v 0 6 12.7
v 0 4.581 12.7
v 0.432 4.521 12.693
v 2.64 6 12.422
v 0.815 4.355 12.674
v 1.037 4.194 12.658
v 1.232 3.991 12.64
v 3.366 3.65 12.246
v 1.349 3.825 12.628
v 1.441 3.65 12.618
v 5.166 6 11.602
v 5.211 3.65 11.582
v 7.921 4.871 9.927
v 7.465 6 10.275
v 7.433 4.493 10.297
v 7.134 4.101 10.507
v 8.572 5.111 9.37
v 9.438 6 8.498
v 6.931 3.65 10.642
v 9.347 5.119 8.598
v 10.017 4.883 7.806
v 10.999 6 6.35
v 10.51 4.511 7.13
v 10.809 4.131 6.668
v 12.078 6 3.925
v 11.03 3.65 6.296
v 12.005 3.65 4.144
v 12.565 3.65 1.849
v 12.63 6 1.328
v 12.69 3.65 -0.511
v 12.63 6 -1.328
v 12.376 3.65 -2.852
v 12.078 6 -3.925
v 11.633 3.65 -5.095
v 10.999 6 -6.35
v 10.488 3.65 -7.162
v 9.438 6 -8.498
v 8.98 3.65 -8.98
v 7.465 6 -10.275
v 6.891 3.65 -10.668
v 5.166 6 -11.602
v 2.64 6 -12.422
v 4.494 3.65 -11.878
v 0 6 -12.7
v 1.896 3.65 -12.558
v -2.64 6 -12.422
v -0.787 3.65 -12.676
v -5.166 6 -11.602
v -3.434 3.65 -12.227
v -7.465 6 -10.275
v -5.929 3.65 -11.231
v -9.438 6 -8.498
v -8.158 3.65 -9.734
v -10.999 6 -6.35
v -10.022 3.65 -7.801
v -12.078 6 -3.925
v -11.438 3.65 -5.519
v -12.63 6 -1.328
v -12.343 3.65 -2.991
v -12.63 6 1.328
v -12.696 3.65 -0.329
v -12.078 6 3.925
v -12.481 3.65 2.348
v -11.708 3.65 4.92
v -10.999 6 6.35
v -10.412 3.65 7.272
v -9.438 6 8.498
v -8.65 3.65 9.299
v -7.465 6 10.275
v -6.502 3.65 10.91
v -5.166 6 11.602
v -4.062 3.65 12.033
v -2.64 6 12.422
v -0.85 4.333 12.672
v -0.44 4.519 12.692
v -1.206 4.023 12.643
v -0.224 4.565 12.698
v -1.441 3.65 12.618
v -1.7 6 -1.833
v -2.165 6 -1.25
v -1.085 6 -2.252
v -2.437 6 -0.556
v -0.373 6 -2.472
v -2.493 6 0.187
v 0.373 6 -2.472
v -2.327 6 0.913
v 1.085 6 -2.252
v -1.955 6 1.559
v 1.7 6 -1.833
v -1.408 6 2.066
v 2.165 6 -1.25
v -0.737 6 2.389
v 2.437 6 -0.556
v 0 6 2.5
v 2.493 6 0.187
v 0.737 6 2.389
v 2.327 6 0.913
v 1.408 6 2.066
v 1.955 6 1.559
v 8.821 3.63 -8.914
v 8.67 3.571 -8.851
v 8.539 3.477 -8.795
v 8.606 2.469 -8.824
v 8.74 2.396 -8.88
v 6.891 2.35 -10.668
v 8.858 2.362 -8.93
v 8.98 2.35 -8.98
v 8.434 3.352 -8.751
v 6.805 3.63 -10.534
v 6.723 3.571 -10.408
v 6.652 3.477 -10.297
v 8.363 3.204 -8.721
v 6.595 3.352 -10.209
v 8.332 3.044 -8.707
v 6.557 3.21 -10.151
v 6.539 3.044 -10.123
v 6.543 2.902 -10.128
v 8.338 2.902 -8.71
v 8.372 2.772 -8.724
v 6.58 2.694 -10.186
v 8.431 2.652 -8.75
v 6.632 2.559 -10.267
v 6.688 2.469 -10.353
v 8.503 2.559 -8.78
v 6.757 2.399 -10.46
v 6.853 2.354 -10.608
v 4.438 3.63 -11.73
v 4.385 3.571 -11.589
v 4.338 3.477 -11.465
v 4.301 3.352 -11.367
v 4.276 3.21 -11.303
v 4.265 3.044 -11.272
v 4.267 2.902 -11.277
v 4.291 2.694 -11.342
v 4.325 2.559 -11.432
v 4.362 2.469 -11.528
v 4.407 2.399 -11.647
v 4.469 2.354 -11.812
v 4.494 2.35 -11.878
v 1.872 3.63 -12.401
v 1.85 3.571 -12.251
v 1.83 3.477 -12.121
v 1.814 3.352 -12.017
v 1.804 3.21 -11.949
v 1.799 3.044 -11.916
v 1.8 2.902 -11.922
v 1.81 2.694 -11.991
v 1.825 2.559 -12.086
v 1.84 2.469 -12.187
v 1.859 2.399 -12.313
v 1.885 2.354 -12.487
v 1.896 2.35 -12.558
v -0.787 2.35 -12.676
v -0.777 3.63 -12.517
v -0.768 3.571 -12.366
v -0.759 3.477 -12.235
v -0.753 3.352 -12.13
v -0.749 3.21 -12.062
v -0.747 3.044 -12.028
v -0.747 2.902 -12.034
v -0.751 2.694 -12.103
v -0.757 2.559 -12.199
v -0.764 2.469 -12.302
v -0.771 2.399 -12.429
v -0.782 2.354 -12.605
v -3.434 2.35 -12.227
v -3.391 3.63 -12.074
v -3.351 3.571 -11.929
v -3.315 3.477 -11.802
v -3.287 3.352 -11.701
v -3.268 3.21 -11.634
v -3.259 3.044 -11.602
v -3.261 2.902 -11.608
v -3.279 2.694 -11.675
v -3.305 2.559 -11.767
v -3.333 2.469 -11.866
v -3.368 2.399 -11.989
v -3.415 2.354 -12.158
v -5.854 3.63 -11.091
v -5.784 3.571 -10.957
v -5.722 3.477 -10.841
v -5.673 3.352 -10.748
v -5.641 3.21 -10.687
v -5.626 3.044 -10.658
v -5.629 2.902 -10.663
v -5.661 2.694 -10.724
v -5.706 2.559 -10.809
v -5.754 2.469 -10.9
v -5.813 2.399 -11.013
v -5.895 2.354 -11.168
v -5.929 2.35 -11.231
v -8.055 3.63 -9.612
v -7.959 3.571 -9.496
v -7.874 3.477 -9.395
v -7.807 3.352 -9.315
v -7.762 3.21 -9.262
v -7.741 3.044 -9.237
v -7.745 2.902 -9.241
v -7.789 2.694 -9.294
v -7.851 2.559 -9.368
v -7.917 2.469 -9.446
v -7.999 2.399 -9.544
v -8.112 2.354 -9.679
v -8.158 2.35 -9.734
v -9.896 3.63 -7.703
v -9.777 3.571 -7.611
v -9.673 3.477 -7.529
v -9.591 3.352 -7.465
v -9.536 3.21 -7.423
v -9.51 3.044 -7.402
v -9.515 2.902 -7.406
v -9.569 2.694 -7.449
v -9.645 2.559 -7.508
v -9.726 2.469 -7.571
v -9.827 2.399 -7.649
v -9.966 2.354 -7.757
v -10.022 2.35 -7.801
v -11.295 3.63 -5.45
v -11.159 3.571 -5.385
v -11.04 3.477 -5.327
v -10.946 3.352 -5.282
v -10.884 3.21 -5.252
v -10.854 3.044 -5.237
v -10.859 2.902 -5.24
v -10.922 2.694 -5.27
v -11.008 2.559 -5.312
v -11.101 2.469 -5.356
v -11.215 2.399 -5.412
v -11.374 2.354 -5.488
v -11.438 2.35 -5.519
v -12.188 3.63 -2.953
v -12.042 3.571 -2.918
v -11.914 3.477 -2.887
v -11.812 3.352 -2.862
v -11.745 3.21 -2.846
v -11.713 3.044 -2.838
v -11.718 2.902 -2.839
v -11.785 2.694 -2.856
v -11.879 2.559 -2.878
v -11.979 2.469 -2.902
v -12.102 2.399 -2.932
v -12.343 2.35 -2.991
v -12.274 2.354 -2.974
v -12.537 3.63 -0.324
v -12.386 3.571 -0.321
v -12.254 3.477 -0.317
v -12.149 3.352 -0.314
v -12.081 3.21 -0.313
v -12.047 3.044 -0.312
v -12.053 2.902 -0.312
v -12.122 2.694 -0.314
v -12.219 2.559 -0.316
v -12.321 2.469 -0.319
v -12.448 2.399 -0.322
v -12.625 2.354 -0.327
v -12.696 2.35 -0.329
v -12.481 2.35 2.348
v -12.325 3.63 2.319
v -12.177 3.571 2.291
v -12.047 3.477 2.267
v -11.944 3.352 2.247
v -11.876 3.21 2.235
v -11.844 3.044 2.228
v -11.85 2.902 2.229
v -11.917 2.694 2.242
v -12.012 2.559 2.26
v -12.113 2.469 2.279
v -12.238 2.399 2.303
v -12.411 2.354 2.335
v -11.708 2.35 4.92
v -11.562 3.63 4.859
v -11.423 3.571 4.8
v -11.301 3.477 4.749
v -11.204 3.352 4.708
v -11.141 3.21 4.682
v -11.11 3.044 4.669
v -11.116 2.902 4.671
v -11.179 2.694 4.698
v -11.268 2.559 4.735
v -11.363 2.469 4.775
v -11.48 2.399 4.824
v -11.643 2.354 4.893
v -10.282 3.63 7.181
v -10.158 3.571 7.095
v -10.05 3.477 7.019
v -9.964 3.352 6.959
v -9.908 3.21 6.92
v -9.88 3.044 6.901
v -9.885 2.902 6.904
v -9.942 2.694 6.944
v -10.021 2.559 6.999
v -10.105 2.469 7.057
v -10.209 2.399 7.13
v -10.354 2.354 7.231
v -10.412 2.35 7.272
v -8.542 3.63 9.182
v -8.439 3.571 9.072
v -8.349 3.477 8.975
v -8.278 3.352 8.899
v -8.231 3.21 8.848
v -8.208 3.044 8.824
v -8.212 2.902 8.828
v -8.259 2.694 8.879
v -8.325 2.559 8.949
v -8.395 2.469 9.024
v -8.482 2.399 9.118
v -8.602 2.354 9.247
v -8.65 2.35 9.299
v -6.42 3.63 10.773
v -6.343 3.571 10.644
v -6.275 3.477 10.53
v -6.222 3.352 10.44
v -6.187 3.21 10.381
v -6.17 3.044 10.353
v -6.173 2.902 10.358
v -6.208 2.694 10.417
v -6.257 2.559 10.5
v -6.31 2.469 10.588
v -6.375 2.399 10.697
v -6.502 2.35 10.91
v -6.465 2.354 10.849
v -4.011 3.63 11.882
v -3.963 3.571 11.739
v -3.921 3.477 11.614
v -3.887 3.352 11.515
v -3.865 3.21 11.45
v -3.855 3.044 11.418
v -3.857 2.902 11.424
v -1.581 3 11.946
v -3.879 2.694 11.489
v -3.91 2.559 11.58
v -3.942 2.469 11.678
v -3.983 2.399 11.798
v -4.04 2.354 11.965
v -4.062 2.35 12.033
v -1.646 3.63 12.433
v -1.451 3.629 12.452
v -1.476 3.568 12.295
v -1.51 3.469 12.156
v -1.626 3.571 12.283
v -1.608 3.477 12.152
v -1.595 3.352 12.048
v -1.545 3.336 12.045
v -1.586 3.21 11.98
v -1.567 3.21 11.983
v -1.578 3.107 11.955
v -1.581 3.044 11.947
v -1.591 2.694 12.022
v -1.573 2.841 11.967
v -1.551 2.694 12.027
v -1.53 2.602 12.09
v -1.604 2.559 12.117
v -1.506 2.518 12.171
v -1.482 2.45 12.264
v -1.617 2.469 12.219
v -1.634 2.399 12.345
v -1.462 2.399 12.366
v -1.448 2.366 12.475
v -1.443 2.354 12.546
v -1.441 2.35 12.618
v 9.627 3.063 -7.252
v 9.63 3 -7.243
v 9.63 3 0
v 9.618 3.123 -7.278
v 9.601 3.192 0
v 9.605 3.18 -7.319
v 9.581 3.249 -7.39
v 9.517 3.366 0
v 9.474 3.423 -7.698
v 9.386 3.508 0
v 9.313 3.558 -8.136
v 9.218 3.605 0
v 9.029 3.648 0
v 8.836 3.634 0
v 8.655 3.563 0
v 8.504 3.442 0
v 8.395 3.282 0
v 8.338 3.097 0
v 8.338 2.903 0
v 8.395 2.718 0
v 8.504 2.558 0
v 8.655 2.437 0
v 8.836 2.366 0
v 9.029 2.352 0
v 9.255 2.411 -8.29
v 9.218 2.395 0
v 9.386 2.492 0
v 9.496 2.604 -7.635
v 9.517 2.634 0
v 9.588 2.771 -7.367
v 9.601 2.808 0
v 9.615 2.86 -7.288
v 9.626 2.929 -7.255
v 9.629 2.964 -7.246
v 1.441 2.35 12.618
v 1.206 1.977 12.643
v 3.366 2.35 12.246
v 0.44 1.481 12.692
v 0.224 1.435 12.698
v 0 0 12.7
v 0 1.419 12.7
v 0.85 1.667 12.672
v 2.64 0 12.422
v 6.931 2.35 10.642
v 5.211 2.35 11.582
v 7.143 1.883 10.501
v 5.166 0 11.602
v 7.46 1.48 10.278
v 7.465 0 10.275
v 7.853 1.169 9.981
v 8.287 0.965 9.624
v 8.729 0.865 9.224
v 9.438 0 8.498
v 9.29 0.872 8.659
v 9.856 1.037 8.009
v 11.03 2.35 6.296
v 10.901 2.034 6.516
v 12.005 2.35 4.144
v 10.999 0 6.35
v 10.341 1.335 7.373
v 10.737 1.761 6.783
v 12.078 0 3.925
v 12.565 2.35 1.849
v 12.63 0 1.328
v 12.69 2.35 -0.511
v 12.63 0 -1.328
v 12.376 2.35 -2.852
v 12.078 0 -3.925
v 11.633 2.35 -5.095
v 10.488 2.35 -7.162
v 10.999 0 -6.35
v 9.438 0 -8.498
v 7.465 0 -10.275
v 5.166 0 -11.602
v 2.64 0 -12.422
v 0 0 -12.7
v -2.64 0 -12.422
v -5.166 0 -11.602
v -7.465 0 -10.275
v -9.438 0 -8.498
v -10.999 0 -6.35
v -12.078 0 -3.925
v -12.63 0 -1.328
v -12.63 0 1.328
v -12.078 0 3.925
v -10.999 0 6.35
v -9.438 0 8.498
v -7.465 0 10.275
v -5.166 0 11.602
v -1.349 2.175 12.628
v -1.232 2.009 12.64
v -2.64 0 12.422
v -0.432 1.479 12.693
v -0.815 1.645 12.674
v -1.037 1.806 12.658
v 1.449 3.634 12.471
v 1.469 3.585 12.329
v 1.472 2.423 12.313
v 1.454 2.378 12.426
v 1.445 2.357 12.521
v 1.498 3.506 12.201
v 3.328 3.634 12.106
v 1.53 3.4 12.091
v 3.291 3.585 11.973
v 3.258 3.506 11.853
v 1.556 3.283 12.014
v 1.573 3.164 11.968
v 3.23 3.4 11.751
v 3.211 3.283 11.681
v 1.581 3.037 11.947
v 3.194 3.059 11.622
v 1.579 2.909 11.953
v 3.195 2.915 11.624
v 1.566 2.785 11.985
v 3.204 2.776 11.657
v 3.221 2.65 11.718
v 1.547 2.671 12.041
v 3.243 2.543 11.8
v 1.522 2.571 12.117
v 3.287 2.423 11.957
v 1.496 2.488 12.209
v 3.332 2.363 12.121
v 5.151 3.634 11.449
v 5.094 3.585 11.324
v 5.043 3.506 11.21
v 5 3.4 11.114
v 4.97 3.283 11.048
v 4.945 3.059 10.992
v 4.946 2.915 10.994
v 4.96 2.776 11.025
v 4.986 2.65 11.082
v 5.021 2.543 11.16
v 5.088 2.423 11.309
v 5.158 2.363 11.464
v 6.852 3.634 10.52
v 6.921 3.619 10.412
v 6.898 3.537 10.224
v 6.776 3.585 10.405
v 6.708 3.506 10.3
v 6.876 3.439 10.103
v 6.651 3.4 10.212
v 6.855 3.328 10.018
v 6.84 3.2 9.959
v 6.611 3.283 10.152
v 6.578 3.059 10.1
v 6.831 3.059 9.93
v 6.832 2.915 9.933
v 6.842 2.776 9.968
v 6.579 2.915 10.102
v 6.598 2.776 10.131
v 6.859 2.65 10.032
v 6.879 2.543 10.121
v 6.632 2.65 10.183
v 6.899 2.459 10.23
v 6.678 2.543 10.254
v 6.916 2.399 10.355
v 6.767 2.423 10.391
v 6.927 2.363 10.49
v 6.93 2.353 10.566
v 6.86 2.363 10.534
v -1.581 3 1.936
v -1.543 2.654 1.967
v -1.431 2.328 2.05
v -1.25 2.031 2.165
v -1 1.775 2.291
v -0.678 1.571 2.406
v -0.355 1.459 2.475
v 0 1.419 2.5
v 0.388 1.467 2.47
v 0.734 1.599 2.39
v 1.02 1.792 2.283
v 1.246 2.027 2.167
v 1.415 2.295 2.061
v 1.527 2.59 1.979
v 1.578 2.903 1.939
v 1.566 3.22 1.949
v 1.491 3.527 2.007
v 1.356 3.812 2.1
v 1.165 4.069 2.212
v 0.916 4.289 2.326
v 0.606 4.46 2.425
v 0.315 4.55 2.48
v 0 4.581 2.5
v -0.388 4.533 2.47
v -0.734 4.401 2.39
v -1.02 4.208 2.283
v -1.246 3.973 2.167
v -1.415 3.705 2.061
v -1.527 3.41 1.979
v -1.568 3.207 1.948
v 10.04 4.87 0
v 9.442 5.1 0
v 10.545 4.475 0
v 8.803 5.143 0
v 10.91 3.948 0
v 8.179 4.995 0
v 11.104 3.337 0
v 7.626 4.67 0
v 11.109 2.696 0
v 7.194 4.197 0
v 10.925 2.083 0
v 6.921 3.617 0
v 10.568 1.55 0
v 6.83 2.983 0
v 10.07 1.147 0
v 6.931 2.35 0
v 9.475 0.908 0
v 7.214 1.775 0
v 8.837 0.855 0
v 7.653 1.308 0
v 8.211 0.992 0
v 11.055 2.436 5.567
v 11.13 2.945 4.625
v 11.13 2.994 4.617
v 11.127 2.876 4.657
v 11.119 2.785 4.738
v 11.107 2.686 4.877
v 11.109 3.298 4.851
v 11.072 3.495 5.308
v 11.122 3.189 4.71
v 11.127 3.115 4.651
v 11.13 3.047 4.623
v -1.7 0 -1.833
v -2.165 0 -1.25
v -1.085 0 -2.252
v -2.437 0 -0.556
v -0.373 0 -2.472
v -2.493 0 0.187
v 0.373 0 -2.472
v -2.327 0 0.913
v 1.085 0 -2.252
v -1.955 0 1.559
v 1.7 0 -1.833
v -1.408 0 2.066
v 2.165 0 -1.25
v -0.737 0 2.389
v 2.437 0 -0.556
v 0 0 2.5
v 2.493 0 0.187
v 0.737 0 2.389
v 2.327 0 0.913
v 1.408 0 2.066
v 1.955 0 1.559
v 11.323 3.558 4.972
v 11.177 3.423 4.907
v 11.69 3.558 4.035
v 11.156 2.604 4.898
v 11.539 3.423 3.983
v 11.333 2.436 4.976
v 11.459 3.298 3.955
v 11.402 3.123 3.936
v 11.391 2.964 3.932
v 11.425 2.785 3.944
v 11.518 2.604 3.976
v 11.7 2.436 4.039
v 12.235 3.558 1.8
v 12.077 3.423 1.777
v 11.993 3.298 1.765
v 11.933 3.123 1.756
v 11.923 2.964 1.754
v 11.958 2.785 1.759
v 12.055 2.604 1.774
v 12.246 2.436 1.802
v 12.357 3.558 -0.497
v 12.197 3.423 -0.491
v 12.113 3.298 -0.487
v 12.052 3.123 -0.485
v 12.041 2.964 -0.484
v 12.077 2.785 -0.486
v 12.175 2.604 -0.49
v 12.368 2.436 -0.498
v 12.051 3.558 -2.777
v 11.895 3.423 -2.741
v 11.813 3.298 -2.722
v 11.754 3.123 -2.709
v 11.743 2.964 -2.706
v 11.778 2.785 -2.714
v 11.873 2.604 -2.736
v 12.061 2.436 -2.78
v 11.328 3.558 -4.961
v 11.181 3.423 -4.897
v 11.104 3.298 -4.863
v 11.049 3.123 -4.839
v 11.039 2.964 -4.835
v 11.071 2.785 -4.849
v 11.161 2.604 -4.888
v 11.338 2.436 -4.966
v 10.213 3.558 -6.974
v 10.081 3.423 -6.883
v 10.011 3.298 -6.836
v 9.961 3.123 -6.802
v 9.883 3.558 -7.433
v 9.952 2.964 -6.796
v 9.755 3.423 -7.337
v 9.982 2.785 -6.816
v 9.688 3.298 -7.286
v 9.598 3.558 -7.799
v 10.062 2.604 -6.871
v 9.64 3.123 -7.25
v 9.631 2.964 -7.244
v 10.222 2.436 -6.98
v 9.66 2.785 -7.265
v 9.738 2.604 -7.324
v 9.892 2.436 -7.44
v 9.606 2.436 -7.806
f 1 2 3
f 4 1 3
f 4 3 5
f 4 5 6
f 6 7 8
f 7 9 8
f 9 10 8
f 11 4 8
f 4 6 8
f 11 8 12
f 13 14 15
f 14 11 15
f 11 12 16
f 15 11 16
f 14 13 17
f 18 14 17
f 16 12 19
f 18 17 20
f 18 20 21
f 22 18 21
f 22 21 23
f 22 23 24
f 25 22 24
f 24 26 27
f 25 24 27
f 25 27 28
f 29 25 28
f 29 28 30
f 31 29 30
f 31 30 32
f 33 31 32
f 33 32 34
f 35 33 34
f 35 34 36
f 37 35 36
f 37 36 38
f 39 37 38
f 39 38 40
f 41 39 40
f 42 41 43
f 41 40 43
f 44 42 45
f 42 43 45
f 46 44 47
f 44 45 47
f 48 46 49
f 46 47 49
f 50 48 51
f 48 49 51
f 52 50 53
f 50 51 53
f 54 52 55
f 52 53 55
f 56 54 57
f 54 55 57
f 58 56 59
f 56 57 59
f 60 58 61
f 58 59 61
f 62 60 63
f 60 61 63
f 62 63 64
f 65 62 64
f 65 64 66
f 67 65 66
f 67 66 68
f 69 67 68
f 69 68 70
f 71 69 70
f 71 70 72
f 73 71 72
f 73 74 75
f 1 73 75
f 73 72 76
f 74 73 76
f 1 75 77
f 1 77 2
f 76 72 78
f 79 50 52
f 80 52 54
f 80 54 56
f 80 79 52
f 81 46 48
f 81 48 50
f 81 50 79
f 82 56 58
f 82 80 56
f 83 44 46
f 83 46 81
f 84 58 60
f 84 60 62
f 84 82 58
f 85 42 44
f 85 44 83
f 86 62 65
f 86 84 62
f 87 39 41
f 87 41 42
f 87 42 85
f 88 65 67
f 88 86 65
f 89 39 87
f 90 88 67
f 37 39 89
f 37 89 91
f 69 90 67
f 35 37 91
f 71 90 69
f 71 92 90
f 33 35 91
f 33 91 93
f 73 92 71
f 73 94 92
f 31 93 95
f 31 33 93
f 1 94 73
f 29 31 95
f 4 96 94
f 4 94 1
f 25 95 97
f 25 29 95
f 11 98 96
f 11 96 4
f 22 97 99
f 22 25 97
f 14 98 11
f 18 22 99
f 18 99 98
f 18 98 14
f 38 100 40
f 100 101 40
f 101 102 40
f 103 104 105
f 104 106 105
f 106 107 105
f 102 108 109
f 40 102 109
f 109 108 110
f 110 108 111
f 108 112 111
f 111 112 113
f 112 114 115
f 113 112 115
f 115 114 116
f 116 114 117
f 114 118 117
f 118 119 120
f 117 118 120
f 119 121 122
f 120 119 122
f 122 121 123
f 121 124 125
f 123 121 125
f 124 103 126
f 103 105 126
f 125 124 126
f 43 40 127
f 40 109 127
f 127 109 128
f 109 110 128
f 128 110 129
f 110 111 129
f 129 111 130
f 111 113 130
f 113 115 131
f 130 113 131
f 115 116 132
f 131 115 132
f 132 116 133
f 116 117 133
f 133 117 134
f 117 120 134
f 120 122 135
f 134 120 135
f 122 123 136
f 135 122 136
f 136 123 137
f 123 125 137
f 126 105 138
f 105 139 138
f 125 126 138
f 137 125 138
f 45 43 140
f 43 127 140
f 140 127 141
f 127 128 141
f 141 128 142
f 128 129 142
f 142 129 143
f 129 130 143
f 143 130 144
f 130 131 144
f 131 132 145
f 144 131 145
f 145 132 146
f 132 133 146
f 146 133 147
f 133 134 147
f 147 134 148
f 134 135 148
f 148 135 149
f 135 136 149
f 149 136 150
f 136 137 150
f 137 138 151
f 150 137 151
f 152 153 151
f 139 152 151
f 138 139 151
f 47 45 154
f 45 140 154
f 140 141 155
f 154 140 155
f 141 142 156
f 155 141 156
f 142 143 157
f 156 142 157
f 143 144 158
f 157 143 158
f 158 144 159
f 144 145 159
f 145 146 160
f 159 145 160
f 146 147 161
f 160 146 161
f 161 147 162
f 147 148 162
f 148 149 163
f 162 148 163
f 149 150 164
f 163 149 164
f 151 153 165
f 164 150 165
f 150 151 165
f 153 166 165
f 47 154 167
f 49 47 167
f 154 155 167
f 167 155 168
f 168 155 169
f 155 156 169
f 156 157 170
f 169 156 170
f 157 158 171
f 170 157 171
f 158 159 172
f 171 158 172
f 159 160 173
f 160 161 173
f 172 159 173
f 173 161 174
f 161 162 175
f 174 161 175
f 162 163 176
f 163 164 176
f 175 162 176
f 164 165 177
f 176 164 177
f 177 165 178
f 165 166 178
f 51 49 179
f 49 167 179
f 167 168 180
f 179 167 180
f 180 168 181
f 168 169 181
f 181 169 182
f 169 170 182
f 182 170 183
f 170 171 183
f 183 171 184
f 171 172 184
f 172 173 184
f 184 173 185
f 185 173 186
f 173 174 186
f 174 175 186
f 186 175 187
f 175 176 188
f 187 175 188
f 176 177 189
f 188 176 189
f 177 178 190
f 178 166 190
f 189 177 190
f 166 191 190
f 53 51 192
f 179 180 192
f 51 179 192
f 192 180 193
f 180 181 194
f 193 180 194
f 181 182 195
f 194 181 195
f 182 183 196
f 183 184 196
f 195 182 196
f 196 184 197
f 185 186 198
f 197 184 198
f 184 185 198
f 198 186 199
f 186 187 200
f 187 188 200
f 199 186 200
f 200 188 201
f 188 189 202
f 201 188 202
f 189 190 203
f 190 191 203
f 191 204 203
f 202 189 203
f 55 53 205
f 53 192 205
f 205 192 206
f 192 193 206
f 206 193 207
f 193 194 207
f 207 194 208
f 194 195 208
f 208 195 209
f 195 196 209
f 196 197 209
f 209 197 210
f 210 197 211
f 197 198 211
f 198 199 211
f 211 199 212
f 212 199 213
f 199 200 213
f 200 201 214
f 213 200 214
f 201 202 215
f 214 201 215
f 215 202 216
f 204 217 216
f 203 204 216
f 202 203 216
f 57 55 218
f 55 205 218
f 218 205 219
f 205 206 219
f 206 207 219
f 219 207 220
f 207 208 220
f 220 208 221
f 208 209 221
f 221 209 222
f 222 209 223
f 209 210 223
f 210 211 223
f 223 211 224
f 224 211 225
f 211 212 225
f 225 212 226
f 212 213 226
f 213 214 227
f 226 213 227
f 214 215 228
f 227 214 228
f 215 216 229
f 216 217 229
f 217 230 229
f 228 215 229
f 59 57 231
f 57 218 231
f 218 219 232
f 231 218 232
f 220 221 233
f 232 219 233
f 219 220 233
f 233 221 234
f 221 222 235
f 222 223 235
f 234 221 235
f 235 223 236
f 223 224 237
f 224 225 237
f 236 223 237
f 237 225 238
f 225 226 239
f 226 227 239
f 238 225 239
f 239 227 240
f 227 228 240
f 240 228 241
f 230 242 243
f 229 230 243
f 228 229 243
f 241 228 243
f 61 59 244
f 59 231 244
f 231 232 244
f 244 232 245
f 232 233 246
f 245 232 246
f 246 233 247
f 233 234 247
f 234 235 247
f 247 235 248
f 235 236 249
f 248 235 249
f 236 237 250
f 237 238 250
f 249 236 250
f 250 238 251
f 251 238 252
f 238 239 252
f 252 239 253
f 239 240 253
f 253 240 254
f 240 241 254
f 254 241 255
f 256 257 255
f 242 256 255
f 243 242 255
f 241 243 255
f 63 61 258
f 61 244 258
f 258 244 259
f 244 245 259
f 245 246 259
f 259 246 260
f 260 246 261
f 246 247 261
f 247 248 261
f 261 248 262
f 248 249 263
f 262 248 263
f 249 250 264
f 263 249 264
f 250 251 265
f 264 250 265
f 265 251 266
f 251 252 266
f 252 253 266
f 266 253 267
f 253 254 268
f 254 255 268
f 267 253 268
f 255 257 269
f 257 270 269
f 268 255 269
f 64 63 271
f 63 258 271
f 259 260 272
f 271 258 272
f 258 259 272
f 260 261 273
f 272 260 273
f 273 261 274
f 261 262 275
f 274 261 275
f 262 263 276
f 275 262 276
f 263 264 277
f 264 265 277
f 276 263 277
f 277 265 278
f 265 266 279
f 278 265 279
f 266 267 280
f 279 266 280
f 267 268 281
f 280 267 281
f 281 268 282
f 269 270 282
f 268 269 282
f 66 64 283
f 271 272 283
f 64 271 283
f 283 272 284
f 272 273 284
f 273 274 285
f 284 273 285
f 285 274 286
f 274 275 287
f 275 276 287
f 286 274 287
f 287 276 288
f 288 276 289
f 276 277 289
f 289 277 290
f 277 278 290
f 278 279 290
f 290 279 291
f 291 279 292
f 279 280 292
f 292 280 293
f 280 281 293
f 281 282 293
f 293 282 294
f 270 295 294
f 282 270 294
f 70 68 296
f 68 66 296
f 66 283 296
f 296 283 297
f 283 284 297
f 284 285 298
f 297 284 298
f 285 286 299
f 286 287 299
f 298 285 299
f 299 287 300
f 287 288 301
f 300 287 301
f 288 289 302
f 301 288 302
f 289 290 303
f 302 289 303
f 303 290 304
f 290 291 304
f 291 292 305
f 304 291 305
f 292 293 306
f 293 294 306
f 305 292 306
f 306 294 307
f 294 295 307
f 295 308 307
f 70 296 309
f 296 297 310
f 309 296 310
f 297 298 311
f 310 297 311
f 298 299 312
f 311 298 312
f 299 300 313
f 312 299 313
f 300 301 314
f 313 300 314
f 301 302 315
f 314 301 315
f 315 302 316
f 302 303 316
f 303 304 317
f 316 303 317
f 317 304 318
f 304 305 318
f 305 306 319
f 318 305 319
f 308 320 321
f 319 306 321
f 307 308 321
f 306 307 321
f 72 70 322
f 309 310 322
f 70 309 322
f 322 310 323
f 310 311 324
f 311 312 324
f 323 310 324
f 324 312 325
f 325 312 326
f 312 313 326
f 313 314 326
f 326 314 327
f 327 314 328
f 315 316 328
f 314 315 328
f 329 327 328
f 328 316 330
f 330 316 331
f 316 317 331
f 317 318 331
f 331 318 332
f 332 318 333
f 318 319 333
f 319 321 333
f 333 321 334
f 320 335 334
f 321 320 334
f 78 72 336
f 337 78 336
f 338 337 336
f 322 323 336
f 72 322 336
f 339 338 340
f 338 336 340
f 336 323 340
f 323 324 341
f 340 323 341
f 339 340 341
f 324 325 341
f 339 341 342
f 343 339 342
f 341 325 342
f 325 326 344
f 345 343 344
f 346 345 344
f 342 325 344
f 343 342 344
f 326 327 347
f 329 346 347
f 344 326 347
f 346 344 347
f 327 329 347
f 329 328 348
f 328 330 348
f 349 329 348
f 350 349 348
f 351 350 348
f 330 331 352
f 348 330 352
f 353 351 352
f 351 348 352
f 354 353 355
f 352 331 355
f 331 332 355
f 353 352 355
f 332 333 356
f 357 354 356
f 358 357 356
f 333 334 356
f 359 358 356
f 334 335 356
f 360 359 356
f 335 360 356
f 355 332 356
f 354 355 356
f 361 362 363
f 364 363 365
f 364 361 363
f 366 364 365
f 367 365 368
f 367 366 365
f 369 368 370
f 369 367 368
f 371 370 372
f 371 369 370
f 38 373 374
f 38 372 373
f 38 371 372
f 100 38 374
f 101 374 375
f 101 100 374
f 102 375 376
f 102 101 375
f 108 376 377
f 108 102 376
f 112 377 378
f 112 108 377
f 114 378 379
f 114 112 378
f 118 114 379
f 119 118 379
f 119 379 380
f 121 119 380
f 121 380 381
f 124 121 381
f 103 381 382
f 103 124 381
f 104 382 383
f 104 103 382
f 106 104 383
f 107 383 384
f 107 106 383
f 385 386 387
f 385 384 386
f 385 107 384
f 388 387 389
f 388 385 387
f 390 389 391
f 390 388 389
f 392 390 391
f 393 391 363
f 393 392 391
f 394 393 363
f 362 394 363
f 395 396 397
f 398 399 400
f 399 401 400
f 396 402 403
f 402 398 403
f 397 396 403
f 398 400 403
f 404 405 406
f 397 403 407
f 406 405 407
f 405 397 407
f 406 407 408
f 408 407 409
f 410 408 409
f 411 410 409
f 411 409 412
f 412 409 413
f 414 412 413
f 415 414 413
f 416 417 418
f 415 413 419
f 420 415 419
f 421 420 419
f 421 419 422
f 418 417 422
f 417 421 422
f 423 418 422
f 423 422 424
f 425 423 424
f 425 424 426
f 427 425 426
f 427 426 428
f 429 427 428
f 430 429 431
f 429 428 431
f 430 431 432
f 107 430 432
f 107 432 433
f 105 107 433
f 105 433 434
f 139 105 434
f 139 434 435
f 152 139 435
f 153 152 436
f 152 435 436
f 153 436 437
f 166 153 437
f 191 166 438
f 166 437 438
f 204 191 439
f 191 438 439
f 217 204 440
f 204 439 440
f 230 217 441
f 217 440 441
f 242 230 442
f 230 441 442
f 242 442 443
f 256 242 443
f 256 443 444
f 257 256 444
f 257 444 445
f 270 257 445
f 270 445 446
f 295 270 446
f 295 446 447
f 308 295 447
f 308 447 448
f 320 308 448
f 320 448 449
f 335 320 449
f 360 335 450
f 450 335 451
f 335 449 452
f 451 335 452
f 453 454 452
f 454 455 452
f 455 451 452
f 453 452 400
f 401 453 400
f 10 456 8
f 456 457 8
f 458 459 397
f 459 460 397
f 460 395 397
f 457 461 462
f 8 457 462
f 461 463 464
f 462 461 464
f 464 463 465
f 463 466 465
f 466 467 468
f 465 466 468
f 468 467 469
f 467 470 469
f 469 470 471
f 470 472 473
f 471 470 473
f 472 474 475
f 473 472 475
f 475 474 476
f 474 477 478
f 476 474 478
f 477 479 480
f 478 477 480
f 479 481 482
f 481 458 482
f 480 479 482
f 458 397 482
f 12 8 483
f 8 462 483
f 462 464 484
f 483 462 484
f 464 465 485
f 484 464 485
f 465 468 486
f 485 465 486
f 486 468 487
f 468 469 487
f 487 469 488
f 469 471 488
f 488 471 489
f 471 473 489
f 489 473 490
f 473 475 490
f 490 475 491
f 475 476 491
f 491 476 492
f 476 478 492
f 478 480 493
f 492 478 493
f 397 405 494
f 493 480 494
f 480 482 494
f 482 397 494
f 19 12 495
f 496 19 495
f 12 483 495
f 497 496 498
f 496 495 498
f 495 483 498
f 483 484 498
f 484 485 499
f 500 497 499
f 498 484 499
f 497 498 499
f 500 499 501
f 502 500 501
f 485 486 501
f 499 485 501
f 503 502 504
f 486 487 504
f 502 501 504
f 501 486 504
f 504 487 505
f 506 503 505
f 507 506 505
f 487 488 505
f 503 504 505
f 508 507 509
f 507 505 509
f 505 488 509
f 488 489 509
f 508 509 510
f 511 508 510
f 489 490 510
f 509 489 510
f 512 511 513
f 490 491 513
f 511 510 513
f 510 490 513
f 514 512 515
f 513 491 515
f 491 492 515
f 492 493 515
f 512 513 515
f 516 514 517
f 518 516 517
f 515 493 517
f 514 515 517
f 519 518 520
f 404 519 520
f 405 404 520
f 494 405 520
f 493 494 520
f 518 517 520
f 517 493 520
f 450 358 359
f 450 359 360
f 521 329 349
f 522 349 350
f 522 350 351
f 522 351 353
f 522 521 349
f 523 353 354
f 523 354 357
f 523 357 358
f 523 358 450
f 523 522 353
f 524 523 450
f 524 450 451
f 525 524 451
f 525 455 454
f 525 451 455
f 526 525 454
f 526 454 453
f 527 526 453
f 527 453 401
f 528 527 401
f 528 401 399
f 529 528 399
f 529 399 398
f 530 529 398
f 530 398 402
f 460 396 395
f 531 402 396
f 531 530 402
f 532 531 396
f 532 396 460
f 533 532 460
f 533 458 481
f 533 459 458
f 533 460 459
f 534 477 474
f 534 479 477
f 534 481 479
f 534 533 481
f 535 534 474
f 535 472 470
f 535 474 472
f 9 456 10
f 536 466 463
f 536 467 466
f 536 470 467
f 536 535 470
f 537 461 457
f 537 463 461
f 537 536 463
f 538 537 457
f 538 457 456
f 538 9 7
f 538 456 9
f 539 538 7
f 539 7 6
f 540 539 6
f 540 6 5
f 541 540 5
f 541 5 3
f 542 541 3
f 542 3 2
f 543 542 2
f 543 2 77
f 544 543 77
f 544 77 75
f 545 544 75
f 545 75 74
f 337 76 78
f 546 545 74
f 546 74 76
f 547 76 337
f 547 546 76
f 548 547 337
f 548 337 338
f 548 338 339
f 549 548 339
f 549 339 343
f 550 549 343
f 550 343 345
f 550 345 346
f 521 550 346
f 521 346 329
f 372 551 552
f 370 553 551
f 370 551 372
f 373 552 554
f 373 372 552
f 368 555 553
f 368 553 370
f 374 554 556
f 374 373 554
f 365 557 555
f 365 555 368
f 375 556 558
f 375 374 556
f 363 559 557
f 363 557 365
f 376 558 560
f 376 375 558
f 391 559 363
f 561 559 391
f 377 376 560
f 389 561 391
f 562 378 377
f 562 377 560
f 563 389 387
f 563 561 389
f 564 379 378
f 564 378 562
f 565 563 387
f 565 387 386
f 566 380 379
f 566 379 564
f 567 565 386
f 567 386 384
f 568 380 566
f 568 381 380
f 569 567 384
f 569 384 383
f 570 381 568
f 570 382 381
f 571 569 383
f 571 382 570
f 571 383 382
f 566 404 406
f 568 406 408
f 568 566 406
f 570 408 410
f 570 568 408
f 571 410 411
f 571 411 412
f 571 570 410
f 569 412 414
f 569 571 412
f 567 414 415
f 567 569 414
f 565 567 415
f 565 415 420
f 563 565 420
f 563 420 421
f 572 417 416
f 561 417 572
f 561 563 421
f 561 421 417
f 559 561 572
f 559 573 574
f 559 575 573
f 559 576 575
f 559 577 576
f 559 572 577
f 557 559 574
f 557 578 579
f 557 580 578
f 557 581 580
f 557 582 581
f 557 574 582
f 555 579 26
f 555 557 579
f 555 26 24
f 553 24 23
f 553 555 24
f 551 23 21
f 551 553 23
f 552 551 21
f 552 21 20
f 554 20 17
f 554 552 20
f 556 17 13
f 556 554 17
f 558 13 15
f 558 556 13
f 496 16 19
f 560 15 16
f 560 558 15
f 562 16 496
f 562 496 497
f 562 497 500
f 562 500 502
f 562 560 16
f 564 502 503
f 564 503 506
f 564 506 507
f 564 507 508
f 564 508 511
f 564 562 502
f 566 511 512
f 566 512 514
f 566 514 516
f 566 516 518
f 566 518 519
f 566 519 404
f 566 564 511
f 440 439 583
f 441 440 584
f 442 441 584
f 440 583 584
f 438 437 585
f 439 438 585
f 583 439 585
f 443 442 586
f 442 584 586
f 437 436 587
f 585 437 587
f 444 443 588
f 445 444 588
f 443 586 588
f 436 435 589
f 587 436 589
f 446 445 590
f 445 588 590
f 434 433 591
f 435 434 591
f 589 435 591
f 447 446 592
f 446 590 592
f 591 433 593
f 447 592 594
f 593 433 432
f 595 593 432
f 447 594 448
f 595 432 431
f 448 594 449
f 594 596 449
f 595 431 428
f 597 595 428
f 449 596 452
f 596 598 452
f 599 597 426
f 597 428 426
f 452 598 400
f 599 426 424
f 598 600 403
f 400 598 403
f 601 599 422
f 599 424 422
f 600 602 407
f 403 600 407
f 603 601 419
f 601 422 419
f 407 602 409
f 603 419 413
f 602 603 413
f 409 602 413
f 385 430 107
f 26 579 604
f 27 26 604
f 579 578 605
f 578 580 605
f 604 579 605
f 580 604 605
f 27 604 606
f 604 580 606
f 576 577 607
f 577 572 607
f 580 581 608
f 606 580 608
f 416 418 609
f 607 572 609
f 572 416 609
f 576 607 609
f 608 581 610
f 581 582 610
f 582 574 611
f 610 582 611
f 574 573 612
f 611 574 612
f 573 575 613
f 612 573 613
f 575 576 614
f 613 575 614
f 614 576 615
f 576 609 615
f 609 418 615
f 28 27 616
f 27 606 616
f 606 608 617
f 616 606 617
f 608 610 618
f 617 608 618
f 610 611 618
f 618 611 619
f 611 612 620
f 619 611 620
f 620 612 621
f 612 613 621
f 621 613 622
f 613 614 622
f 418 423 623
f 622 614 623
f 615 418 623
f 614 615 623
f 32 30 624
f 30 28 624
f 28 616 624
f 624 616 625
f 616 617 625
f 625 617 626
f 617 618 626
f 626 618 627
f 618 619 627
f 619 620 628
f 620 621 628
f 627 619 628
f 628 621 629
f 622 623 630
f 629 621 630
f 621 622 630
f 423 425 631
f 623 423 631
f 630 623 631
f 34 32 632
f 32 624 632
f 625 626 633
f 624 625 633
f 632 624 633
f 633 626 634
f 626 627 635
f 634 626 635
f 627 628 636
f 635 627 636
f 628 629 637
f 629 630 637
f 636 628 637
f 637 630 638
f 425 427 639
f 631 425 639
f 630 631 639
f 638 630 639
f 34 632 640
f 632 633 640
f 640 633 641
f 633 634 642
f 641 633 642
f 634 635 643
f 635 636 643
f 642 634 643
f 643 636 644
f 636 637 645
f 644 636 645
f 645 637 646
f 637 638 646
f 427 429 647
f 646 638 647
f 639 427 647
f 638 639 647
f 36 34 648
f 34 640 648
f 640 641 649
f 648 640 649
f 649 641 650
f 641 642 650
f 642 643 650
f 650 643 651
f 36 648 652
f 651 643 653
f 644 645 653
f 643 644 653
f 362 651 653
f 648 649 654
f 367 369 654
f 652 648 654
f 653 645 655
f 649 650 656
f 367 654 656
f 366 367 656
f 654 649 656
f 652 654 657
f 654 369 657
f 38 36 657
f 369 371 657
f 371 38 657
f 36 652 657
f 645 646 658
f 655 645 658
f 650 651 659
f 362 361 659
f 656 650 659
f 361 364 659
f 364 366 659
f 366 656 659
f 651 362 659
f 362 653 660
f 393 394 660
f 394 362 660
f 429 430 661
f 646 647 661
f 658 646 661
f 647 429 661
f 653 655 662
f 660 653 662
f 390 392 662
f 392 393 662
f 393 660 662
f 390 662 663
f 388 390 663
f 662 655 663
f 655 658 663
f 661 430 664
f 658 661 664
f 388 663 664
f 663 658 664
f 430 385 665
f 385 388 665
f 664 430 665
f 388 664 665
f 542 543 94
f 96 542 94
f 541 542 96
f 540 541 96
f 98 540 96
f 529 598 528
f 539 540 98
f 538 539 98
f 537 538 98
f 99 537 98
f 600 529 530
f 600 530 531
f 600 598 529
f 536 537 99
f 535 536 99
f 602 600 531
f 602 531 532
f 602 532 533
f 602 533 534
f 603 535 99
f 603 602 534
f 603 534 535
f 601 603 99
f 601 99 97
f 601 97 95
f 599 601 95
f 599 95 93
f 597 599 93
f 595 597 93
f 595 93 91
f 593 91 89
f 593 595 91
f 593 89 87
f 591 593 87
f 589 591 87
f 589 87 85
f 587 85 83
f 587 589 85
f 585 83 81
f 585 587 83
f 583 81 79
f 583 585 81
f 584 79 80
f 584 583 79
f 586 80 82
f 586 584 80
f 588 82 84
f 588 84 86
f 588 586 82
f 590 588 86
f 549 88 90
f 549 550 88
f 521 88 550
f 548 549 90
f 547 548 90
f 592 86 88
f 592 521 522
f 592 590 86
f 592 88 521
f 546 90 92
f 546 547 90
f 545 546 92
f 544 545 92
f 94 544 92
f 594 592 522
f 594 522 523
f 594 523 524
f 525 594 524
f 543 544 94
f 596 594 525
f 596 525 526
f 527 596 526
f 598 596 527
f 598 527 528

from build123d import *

# Parameters (mm, degrees)
BASE_R                  = 12.7
BASE_R_2                = 2.5
MAIN_BODY_DEPTH         = 6
SKETCH4_R               = 0.65
CUT_EXTRUDE2_REACH      = 20.936
SKETCH5_R               = 1.58115
CUT_EXTRUDE3_DEPTH      = 19.936208869
CUT_EXTRUDE3_DEPTH_BACK = 19.936208869
SKETCH8_R               = 0.65
SKETCH9_R               = 2.15
CUT_EXTRUDE4_DEPTH      = 19.936208869


with BuildPart() as part:
    # BASE → MAIN_BODY (new body)
    with BuildSketch(Plane(origin=(0, 0, 0), x_dir=(1, 0, 0), z_dir=(0, 1, 0))):
        Circle(BASE_R)
        Circle(BASE_R_2, mode=Mode.SUBTRACT)
    extrude(amount=MAIN_BODY_DEPTH)

    # Sketch4 → CABLE_GUIDE (revolve, cut)
    with BuildSketch(Plane.XY):
        with Locations((12.7, 3)):
            Circle(SKETCH4_R)
    revolve(axis=Axis((0, 0, 0), (0, 1, 0)), mode=Mode.SUBTRACT)

    # Sketch5 → Cut-Extrude2 (cut, up to next)
    with BuildSketch(Plane.XY, mode=Mode.PRIVATE) as cut_extrude2_sk1:
        with Locations((0, 3)):
            Circle(SKETCH5_R)
    cut_extrude2_tool1 = extrude(cut_extrude2_sk1.sketch, amount=CUT_EXTRUDE2_REACH, mode=Mode.PRIVATE) & part.part
    add(cut_extrude2_tool1.solids().sort_by_distance((0, 3, 0))[0], mode=Mode.SUBTRACT)

    # Sketch8 → Cut-Extrude3 (cut, two sides: drawn at the far end of the back side and taken through both)
    with BuildSketch(Plane.XY.offset(-CUT_EXTRUDE3_DEPTH_BACK)):
        with Locations((8.98025612, 3)):
            Circle(SKETCH8_R)
    extrude(amount=CUT_EXTRUDE3_DEPTH + CUT_EXTRUDE3_DEPTH_BACK, mode=Mode.SUBTRACT)

    # Sketch9 → Cut-Extrude4 (cut, through all)
    with BuildSketch(Plane.XY):
        with Locations((8.98025612, 3)):
            Circle(SKETCH9_R)
    extrude(amount=CUT_EXTRUDE4_DEPTH, mode=Mode.SUBTRACT)


solid = part.part
